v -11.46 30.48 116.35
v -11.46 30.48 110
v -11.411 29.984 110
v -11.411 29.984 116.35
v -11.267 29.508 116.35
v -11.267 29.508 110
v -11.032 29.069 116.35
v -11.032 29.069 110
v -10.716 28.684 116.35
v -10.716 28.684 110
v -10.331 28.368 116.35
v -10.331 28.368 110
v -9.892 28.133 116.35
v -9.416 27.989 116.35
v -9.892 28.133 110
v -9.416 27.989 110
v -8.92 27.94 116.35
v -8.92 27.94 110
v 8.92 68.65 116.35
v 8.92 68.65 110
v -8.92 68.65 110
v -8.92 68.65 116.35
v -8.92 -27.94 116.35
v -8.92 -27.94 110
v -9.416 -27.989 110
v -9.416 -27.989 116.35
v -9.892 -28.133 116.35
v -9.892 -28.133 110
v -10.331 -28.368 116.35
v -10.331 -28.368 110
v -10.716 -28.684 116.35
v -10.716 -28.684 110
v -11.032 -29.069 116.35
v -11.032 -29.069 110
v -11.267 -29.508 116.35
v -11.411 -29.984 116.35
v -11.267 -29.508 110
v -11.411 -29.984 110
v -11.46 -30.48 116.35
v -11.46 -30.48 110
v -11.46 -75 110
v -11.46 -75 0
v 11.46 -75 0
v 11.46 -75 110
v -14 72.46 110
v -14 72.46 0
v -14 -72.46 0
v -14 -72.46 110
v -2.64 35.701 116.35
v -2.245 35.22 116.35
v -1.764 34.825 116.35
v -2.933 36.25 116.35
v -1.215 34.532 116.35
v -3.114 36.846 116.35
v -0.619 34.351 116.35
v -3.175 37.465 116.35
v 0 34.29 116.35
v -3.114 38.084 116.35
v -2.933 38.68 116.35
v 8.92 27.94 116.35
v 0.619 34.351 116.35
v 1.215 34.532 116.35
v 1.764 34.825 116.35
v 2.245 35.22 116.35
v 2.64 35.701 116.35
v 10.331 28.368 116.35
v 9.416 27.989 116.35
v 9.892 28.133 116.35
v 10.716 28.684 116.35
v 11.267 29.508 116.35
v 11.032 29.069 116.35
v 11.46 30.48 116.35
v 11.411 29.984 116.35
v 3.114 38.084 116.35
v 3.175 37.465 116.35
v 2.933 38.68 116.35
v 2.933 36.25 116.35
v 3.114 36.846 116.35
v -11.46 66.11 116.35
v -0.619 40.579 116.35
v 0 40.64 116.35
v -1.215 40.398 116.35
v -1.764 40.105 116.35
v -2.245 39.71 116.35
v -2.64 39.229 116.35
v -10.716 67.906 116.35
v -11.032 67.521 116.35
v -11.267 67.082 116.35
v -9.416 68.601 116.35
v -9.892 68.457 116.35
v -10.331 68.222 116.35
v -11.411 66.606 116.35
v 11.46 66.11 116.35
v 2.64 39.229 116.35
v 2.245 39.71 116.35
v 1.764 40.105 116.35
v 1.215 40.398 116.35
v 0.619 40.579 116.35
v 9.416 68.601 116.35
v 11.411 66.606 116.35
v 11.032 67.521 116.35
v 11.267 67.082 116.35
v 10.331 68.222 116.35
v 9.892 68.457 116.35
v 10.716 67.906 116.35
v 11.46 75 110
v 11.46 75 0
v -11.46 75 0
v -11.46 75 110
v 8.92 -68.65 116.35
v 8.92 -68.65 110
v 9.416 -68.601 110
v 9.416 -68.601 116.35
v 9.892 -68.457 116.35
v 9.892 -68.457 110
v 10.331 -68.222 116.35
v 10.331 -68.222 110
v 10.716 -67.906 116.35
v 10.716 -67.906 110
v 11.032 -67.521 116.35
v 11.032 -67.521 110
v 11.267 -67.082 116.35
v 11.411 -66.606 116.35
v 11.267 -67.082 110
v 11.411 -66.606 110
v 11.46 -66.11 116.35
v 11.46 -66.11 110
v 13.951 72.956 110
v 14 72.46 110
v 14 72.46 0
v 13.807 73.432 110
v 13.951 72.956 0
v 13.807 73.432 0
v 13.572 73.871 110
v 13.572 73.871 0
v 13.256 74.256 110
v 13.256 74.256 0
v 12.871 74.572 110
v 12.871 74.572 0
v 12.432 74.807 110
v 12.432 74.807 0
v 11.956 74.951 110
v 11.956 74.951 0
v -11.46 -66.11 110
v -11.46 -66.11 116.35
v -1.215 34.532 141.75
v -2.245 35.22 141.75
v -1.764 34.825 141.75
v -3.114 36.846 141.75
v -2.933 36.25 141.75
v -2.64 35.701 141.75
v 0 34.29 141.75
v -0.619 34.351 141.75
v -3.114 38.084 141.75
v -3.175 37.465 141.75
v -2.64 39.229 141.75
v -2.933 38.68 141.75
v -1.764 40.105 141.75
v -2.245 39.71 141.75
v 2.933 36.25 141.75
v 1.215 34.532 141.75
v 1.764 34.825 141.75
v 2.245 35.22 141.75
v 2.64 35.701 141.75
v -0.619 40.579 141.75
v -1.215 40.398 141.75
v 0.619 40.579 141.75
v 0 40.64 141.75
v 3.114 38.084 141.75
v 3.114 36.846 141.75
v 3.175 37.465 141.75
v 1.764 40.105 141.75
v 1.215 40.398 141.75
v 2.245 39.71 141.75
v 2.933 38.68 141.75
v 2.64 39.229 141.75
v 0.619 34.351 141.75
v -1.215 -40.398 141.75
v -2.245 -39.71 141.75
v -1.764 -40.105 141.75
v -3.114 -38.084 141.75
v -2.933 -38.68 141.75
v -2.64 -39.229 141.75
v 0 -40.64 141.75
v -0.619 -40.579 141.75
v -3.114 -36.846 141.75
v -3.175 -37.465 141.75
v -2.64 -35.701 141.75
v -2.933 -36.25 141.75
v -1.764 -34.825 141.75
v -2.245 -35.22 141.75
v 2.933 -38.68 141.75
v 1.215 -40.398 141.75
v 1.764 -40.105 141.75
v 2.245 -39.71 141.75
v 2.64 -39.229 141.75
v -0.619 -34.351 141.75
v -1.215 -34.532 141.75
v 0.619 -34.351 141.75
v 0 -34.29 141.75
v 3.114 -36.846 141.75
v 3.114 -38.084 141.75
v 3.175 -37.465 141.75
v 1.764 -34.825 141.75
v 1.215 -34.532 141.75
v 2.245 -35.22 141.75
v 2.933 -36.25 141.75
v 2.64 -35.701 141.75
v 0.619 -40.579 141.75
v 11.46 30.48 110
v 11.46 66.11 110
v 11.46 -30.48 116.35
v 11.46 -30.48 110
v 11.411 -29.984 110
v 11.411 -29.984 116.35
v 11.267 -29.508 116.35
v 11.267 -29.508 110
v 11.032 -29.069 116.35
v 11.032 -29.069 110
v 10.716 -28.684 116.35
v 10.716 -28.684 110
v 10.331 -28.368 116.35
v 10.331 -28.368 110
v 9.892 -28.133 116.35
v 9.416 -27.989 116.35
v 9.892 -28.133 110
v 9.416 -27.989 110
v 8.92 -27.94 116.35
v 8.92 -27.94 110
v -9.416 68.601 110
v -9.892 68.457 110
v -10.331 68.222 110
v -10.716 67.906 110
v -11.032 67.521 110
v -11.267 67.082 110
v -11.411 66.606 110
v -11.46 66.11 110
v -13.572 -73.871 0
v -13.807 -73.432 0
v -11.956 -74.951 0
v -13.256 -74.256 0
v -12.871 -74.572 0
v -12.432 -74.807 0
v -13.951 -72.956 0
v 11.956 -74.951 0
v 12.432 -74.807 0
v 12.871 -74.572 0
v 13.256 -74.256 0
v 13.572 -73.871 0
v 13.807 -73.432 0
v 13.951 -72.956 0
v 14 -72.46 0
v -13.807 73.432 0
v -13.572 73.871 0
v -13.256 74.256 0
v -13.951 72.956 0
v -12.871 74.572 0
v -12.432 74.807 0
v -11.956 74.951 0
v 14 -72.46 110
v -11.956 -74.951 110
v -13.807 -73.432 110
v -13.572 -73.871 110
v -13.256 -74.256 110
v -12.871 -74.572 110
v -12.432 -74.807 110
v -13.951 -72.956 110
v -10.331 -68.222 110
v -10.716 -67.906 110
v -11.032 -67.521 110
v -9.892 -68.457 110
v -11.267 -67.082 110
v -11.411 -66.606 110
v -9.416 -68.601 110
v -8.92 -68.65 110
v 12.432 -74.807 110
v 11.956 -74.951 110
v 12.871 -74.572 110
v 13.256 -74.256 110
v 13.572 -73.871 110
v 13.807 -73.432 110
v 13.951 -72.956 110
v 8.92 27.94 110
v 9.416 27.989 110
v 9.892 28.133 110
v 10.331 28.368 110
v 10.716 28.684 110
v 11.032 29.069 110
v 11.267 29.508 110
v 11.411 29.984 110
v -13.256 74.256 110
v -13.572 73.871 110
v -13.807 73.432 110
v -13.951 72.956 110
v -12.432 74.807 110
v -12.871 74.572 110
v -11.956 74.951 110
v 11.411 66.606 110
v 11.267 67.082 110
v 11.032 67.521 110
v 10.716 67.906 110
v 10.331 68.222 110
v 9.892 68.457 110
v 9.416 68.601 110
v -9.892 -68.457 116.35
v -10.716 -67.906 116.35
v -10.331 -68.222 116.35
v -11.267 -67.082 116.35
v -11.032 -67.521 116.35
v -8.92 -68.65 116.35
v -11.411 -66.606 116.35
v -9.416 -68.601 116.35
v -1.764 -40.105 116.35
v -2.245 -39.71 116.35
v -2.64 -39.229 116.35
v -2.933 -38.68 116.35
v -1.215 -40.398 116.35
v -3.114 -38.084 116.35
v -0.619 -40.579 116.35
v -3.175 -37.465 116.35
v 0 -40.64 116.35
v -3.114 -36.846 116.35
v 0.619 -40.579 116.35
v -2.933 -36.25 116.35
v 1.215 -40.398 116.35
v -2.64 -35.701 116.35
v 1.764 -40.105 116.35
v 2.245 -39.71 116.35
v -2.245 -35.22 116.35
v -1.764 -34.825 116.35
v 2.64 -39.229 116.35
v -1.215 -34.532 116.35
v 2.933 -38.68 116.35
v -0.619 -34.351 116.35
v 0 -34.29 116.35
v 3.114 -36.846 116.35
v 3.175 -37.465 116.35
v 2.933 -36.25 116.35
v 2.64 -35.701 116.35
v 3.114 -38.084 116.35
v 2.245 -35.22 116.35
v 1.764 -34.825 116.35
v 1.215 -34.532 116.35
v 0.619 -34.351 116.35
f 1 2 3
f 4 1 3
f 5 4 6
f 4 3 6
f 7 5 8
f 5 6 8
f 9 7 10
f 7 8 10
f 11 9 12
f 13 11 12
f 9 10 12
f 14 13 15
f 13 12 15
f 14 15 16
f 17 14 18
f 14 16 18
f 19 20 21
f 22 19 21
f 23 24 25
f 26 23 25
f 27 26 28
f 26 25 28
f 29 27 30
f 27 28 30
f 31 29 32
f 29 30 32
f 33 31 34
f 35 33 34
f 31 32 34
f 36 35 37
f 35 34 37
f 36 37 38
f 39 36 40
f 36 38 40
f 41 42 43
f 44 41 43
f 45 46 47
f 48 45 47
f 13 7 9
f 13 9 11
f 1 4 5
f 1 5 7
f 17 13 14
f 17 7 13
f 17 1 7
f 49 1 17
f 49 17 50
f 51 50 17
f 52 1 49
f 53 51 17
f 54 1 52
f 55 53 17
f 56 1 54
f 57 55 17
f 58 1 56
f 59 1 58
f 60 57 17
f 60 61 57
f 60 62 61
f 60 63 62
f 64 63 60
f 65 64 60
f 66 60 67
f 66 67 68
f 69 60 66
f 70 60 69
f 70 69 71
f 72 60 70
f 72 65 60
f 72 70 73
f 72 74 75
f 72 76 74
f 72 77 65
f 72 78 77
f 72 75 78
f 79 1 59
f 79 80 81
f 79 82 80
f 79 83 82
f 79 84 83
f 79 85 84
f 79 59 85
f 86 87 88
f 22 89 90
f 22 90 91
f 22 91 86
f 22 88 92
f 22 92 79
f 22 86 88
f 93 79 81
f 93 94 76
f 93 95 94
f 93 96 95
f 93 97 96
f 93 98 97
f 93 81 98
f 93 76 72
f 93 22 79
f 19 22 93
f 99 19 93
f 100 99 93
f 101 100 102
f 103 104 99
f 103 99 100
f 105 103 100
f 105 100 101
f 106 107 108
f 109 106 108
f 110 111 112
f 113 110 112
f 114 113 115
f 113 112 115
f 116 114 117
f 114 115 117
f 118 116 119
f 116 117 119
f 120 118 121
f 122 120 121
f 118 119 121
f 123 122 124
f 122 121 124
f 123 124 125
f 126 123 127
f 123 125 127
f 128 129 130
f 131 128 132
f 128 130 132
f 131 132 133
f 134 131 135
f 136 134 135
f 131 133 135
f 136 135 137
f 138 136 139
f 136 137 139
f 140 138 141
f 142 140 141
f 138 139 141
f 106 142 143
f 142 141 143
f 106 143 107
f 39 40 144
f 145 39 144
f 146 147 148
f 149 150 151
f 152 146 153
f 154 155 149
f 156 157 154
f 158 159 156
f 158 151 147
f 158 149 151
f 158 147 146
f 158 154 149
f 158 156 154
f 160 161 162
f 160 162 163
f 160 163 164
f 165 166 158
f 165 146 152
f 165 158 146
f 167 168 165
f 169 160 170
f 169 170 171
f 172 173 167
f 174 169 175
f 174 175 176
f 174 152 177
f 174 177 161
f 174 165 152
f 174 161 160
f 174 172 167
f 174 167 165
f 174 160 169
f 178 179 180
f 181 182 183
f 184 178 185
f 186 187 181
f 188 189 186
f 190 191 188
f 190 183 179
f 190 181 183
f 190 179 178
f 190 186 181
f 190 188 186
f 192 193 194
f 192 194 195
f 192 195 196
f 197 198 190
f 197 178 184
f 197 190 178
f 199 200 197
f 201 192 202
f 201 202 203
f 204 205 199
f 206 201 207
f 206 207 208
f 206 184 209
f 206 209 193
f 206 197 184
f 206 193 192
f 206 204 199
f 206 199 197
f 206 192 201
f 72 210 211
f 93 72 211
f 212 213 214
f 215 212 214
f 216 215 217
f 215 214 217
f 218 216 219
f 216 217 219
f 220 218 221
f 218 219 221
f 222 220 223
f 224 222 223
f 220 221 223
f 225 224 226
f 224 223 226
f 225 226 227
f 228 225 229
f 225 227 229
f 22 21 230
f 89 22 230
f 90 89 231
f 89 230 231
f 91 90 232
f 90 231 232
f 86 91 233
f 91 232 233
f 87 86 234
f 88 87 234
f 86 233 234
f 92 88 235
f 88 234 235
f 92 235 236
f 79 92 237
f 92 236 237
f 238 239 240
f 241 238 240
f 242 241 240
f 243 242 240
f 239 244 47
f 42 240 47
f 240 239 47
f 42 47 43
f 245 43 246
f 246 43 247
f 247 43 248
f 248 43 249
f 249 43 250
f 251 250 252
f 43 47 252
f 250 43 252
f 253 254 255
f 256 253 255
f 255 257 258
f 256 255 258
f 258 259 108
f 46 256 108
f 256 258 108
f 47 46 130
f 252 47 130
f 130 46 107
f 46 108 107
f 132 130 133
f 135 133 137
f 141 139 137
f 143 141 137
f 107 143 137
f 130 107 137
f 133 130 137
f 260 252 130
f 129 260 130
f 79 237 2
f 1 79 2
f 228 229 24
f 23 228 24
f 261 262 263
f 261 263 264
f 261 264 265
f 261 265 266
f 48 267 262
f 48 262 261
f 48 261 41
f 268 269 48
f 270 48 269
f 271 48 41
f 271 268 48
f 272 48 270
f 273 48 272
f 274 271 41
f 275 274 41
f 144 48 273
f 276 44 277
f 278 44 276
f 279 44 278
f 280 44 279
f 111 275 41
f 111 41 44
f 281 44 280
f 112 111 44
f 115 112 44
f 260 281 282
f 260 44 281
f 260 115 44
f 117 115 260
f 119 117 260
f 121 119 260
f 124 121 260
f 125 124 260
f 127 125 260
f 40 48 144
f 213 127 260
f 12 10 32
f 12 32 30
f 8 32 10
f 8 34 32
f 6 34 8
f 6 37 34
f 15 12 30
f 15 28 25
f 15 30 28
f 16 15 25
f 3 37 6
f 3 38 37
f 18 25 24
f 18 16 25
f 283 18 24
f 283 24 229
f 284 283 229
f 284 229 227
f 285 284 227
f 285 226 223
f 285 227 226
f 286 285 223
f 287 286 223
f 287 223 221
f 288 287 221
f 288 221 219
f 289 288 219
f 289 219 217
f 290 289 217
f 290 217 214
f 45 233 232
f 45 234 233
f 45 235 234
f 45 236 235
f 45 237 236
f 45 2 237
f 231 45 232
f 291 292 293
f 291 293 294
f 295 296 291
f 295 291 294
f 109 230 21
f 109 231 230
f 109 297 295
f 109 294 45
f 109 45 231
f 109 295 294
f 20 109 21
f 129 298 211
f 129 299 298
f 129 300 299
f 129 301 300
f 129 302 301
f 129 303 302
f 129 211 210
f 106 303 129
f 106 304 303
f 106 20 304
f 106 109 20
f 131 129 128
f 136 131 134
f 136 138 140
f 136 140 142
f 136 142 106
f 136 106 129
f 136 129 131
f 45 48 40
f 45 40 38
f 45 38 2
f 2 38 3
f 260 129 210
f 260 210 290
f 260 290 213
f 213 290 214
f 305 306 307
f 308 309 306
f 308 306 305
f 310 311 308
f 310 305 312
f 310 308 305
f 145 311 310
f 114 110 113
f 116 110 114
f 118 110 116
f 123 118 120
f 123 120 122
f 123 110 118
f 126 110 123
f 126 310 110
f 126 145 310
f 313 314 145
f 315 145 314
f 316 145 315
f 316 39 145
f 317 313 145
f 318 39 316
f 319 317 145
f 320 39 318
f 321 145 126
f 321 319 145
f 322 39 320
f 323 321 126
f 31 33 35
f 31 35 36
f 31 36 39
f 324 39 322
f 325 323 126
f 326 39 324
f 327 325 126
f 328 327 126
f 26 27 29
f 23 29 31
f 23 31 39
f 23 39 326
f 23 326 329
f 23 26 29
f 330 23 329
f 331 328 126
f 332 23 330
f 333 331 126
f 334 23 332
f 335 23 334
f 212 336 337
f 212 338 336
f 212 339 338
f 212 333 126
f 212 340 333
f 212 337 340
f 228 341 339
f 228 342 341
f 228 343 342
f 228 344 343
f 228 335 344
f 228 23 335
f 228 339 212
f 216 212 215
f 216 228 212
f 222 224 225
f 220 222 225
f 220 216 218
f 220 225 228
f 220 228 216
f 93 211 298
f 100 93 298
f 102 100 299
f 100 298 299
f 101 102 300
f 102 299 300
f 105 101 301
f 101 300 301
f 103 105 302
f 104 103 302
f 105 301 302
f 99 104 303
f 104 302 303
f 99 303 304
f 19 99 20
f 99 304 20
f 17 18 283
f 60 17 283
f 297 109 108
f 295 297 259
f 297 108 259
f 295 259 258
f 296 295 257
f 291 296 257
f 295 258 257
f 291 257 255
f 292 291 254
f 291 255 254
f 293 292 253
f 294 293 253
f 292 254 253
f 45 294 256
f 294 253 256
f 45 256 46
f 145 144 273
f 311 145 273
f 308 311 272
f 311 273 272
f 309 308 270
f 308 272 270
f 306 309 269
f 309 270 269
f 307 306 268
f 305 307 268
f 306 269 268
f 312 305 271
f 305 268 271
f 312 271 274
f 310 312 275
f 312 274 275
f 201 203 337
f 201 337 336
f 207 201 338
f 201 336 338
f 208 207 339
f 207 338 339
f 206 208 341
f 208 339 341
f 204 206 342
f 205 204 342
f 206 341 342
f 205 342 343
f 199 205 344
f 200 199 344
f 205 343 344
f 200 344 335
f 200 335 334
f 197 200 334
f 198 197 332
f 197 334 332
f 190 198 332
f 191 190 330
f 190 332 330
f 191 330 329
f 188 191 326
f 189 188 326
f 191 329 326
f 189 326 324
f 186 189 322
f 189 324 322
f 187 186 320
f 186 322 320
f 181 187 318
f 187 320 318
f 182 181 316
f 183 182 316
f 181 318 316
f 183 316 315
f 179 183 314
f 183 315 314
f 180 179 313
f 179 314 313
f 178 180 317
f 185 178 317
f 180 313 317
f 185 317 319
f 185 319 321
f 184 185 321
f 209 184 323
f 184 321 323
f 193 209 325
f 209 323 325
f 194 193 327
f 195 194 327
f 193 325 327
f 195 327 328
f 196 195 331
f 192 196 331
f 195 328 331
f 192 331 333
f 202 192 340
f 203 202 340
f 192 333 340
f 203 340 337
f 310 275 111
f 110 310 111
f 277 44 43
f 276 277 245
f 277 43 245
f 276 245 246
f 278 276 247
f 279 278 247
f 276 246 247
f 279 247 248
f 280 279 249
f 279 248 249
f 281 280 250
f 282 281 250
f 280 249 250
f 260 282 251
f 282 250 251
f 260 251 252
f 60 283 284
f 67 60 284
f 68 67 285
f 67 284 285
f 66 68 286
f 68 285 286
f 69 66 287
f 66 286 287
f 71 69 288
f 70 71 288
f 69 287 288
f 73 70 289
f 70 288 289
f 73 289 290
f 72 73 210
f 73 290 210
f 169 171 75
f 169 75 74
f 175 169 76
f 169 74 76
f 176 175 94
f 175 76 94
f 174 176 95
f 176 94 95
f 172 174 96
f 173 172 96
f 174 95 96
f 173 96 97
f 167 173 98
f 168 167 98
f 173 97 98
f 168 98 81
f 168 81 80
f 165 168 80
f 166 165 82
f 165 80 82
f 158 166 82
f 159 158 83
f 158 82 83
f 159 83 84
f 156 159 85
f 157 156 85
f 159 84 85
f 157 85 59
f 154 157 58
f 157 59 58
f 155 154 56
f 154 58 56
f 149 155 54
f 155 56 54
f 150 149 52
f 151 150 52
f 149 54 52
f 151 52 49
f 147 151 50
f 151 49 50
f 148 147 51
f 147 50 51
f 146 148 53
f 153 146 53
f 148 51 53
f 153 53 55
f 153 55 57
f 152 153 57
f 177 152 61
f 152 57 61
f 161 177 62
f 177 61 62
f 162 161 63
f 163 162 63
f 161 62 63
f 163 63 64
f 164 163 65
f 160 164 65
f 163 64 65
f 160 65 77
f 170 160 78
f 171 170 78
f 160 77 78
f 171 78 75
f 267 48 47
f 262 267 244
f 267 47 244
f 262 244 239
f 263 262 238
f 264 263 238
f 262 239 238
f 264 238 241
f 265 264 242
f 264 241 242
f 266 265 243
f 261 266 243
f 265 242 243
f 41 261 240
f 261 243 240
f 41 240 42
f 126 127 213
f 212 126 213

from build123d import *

# Parameters (mm, degrees)
F1_DEPTH = 110
F3_DEPTH = 6.35
F4_R     = 3.175
F5_DEPTH = 25.4


with BuildPart() as f1:
    # F0 (on Top) → F1 (new body)
    with BuildSketch(Plane.XY):
        with BuildLine():
            ThreePointArc((14, 72.46), (13.256051, 74.256051), (11.46, 75))
            Line((11.46, 75), (-11.46, 75))
            ThreePointArc((-11.46, 75), (-13.256051, 74.256051), (-14, 72.46))
            Line((-14, 72.46), (-14, -72.46))
            ThreePointArc((-14, -72.46), (-13.256051, -74.256051), (-11.46, -75))
            Line((-11.46, -75), (11.46, -75))
            ThreePointArc((11.46, -75), (13.256051, -74.256051), (14, -72.46))
            Line((14, -72.46), (14, 72.46))
        make_face()
    extrude(amount=F1_DEPTH)

    # F2 (on face) → F3 (join)
    with BuildSketch(Plane.XY.offset(110)):
        with BuildLine():
            ThreePointArc((-11.46, -66.11), (-10.716051, -67.906051), (-8.92, -68.65))
            Line((-8.92, -68.65), (8.92, -68.65))
            ThreePointArc((8.92, -68.65), (10.716051, -67.906051), (11.46, -66.11))
            Line((11.46, -66.11), (11.46, -30.48))
            ThreePointArc((11.46, -30.48), (10.716051, -28.683949), (8.92, -27.94))
            Line((8.92, -27.94), (-8.92, -27.94))
            ThreePointArc((-8.92, -27.94), (-10.716051, -28.683949), (-11.46, -30.48))
            Line((-11.46, -30.48), (-11.46, -66.11))
        make_face()
        with BuildLine():
            Line((8.92, 68.65), (-8.92, 68.65))
            ThreePointArc((-8.92, 68.65), (-10.716051, 67.906051), (-11.46, 66.11))
            Line((-11.46, 66.11), (-11.46, 30.48))
            ThreePointArc((-11.46, 30.48), (-10.716051, 28.683949), (-8.92, 27.94))
            Line((-8.92, 27.94), (8.92, 27.94))
            ThreePointArc((8.92, 27.94), (10.716051, 28.683949), (11.46, 30.48))
            Line((11.46, 30.48), (11.46, 66.11))
            ThreePointArc((11.46, 66.11), (10.716051, 67.906051), (8.92, 68.65))
        make_face()
    extrude(amount=F3_DEPTH)

    # F4 (on face) → F5 (join)
    with BuildSketch(Plane.XY.offset(116.35)):
        with Locations((0, -37.465)):
            Circle(F4_R)
        with Locations((0, 37.465)):
            Circle(F4_R)
    extrude(amount=F5_DEPTH)


solid = f1.part
